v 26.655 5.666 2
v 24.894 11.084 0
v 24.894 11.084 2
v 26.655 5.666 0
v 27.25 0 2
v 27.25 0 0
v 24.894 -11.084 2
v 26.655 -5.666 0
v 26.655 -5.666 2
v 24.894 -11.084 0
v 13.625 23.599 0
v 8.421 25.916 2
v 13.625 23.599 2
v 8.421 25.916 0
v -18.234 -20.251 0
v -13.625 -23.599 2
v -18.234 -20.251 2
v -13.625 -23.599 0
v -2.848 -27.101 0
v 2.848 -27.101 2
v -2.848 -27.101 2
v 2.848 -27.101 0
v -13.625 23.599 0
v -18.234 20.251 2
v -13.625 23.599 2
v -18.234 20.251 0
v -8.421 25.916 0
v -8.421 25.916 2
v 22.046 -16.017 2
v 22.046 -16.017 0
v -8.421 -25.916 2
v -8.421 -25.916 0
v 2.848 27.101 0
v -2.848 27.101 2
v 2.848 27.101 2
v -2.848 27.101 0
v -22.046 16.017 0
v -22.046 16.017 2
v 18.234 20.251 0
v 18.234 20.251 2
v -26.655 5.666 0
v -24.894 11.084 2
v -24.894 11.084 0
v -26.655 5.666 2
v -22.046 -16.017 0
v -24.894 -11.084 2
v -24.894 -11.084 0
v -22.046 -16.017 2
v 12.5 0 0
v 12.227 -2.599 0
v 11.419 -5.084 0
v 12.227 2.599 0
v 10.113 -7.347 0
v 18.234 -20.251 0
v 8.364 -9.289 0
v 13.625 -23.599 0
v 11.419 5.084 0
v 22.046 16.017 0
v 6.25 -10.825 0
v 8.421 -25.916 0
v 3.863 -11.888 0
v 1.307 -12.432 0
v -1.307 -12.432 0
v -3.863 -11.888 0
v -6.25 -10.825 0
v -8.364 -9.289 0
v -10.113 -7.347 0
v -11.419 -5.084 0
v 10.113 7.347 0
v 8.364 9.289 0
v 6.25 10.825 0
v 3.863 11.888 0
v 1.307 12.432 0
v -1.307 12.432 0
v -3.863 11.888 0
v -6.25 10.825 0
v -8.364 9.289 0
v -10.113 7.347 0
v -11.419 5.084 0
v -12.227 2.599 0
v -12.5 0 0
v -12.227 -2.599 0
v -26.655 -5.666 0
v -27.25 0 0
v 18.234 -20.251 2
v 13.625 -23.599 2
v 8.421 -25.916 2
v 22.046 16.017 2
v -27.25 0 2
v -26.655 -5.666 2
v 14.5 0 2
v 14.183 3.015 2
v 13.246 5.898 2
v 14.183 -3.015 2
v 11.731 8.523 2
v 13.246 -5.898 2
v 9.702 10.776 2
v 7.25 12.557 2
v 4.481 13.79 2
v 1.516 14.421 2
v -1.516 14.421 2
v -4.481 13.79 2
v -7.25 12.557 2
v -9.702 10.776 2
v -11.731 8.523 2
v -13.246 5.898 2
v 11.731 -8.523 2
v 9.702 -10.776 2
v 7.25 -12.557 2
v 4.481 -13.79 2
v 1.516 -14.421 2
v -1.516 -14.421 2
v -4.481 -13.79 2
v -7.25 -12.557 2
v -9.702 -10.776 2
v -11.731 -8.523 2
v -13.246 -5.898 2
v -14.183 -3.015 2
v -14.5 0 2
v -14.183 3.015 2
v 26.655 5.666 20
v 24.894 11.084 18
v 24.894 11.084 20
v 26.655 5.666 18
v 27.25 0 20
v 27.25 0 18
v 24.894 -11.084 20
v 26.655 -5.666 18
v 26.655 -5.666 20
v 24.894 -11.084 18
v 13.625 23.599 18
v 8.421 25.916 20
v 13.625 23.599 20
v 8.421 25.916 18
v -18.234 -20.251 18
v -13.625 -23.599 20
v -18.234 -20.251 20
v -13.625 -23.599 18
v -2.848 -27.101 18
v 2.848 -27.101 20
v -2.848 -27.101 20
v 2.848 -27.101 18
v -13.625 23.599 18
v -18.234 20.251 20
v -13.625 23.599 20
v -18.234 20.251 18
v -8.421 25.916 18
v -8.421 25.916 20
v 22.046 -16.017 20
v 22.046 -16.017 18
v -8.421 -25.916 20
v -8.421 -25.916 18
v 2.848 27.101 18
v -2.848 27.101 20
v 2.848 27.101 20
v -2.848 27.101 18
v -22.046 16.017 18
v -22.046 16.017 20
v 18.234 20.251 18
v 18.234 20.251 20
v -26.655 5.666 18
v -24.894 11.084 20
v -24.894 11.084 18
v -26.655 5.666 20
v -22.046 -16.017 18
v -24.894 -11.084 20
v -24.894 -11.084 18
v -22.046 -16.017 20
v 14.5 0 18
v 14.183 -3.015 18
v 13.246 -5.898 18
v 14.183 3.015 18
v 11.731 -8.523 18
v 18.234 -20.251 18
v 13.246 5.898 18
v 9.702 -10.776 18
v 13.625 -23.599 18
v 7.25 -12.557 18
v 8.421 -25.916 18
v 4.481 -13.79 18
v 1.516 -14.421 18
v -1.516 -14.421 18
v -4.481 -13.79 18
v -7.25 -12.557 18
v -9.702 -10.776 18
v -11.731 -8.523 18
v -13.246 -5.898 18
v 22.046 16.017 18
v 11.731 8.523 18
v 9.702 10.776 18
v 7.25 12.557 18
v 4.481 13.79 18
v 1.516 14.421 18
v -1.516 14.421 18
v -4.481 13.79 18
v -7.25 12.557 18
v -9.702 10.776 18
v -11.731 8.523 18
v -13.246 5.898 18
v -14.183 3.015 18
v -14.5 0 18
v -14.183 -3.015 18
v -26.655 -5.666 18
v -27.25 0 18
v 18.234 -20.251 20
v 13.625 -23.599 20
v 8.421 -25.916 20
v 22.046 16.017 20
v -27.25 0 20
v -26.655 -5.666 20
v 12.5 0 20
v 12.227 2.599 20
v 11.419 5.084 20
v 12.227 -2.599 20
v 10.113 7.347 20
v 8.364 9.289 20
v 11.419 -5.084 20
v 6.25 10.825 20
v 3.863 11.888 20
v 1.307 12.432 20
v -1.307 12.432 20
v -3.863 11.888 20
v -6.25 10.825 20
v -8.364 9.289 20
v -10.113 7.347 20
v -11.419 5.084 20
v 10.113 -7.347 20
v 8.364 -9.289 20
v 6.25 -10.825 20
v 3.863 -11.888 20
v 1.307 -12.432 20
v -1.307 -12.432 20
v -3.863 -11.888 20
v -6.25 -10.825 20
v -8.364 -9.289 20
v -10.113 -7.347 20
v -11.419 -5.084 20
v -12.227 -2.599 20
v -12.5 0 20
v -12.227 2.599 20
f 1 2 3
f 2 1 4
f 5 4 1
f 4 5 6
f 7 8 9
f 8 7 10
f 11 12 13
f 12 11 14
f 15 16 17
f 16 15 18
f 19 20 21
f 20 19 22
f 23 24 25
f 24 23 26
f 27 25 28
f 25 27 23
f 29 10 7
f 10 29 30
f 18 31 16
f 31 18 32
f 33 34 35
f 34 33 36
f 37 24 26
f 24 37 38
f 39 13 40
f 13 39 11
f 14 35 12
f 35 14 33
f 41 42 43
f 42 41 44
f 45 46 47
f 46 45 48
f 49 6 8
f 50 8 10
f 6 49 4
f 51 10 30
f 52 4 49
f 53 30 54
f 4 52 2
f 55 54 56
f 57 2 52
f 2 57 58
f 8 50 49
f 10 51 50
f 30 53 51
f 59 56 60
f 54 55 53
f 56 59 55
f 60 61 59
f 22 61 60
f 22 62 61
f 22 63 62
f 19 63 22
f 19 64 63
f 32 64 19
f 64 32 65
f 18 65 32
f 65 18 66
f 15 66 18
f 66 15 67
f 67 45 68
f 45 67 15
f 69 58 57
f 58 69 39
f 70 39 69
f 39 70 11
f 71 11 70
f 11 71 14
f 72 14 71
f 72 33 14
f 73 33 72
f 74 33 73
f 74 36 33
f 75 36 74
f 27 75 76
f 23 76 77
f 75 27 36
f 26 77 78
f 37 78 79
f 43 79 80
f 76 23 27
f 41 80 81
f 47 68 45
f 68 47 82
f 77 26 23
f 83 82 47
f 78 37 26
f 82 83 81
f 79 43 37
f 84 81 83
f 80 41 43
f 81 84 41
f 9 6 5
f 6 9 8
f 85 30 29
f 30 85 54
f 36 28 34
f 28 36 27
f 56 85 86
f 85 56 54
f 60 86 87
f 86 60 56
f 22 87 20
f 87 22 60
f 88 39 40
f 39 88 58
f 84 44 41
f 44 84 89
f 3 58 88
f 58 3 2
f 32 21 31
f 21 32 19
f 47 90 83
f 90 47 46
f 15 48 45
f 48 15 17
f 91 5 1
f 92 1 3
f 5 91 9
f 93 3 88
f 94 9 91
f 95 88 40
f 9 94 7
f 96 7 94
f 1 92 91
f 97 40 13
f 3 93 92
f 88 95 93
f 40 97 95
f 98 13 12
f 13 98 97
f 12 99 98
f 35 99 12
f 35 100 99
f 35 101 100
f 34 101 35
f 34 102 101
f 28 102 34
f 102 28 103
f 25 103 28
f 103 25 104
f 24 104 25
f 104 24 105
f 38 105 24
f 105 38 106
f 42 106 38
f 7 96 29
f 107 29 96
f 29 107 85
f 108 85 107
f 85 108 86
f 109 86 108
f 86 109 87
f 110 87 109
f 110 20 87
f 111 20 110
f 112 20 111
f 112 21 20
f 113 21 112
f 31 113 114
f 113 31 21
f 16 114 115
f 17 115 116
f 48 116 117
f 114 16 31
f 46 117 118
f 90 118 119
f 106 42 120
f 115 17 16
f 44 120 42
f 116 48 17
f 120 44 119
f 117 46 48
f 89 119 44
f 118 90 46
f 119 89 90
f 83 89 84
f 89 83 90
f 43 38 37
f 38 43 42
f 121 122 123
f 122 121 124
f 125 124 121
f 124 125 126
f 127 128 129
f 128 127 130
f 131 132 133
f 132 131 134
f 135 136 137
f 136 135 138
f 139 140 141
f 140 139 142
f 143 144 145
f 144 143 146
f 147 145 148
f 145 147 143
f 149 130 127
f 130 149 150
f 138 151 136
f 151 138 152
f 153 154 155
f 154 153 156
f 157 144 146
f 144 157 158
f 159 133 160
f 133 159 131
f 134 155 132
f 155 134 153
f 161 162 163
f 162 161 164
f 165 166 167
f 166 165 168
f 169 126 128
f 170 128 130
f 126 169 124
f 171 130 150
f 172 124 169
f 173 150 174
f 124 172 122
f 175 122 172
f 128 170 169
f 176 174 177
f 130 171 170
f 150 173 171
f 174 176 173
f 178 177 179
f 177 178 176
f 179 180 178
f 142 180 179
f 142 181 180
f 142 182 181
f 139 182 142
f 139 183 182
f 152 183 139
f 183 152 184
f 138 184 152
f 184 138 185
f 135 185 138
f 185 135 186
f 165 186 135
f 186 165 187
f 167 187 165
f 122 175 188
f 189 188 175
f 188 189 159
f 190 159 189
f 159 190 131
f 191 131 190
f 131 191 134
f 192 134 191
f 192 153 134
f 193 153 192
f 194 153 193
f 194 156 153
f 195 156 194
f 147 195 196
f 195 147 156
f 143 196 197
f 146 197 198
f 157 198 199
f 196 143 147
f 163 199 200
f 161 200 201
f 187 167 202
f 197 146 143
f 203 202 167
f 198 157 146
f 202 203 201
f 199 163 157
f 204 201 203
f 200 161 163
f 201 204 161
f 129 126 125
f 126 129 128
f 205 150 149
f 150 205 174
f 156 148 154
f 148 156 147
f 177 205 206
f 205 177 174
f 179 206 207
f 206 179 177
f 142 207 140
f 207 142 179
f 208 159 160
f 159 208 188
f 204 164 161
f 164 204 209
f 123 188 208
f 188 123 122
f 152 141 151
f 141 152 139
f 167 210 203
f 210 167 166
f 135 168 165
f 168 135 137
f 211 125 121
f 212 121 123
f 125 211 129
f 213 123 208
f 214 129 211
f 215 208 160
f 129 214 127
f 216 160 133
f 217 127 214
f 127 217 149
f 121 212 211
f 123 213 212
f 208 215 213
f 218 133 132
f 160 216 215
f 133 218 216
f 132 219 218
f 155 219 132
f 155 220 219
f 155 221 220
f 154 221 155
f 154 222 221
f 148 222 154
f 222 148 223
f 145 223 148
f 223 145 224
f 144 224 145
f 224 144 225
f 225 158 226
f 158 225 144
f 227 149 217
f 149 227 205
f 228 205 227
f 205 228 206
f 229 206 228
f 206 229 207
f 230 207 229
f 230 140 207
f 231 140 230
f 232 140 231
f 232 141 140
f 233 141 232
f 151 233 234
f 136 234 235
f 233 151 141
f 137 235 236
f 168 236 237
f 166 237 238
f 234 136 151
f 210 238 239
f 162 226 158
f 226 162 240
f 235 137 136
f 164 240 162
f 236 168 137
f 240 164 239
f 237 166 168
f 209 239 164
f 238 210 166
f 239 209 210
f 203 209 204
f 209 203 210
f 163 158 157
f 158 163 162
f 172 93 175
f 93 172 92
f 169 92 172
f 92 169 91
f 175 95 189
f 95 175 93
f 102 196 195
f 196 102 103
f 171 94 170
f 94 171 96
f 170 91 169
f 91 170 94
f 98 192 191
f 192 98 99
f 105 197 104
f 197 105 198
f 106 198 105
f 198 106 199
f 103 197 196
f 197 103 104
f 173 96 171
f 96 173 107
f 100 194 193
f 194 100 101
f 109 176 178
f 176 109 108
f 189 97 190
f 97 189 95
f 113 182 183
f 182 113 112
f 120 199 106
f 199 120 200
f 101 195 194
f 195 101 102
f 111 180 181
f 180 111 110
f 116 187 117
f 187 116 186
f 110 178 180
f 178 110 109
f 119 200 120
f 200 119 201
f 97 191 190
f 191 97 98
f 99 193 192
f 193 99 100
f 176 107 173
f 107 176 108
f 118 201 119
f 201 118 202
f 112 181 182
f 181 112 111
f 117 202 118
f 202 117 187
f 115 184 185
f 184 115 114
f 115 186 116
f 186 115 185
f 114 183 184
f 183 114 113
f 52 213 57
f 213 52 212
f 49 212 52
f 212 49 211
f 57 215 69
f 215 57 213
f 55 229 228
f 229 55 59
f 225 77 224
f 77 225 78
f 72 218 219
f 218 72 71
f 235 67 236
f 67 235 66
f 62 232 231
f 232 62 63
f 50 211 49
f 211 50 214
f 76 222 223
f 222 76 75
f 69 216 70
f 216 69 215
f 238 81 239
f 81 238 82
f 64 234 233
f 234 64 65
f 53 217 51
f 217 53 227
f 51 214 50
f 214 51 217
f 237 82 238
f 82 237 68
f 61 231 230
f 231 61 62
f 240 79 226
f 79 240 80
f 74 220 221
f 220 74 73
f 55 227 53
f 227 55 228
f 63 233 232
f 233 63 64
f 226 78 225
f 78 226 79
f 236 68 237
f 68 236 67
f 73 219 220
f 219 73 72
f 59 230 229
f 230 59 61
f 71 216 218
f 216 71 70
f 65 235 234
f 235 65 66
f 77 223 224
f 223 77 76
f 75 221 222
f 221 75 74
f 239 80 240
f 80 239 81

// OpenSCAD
// measurements

spool_inner_diameter = 25;
spool_outer_diameter = 54.5;
spool_height = 20;;
edge_thickness = 2;

epsilon = .001;

module spool_edge() {
        cylinder(h=edge_thickness, r=spool_outer_diameter/2);
}

module spool() {
    difference() {
        union() {
            spool_edge();

            translate([0,0,spool_height-edge_thickness])
            spool_edge();

            cylinder(h=spool_height, r=spool_inner_diameter/2+edge_thickness);
        }
        translate([0,0,-epsilon])
        cylinder(h=spool_height+2*epsilon, r=spool_inner_diameter/2);
    }
}
spool();
